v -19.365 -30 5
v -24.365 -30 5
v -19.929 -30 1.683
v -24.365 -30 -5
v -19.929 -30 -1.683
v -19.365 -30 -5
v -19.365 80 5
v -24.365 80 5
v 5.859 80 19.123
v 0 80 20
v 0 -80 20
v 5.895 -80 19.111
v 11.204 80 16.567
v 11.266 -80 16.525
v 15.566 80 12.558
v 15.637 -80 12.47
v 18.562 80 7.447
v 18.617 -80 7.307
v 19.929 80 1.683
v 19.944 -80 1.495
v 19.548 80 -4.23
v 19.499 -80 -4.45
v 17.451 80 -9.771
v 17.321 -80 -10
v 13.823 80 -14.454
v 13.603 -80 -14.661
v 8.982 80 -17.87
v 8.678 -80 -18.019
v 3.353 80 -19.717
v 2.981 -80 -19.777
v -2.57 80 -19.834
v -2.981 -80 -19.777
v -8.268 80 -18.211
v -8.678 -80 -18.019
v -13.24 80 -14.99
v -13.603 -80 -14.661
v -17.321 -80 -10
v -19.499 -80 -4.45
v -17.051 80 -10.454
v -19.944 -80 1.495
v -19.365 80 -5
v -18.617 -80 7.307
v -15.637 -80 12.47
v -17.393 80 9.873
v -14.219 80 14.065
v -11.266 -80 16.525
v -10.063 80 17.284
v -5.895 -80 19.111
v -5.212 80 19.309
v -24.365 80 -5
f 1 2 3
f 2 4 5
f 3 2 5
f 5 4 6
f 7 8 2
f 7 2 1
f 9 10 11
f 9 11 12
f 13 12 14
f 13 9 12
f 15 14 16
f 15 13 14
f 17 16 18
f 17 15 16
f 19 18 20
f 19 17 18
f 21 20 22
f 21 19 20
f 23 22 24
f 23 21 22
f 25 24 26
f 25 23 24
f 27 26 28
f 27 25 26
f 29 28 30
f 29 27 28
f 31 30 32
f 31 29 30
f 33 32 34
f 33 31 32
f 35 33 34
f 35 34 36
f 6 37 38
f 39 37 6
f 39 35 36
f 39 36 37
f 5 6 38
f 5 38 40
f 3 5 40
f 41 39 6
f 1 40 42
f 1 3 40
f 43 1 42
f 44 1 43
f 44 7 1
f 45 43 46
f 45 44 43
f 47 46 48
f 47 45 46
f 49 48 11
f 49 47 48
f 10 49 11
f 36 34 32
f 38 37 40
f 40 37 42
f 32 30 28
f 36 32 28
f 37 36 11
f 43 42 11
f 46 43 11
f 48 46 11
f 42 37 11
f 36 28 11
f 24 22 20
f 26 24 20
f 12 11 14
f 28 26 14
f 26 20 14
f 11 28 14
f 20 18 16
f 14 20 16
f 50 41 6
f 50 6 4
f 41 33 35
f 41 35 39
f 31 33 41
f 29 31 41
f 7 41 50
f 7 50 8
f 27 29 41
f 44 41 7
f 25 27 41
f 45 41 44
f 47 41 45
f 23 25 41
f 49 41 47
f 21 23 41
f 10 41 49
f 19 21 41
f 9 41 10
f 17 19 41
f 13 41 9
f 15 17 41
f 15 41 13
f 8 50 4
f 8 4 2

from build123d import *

# Parameters (mm, degrees)
SKETCH1_R           = 20
BOSS_EXTRUDE1_DEPTH = 80
BOSS_EXTRUDE2_DEPTH = 110


with BuildPart() as part:
    # Sketch1 → Boss-Extrude1 (new, symmetric)
    with BuildSketch(Plane(origin=(0, 0, 0), x_dir=(1, 0, 0), z_dir=(0, 1, 0))):
        with Locations(Location((0, 0, 0), (0, 0, 270))):
            Circle(SKETCH1_R)
    extrude(amount=BOSS_EXTRUDE1_DEPTH, both=True)

    # Sketch2 → Boss-Extrude2 (add)
    with BuildSketch(Plane(origin=(0, 80, 0), x_dir=(1, 0, 0), z_dir=(0, 1, 0))):
        with BuildLine():
            ThreePointArc((-19.364916731, -5), (-20, 0), (-19.364916731, 5))
            Line((-19.364916731, 5), (-24.364916731, 5))
            Line((-24.364916731, 5), (-24.364916731, -5))
            Line((-24.364916731, -5), (-19.364916731, -5))
        make_face()
    extrude(amount=-BOSS_EXTRUDE2_DEPTH)


solid = part.part
